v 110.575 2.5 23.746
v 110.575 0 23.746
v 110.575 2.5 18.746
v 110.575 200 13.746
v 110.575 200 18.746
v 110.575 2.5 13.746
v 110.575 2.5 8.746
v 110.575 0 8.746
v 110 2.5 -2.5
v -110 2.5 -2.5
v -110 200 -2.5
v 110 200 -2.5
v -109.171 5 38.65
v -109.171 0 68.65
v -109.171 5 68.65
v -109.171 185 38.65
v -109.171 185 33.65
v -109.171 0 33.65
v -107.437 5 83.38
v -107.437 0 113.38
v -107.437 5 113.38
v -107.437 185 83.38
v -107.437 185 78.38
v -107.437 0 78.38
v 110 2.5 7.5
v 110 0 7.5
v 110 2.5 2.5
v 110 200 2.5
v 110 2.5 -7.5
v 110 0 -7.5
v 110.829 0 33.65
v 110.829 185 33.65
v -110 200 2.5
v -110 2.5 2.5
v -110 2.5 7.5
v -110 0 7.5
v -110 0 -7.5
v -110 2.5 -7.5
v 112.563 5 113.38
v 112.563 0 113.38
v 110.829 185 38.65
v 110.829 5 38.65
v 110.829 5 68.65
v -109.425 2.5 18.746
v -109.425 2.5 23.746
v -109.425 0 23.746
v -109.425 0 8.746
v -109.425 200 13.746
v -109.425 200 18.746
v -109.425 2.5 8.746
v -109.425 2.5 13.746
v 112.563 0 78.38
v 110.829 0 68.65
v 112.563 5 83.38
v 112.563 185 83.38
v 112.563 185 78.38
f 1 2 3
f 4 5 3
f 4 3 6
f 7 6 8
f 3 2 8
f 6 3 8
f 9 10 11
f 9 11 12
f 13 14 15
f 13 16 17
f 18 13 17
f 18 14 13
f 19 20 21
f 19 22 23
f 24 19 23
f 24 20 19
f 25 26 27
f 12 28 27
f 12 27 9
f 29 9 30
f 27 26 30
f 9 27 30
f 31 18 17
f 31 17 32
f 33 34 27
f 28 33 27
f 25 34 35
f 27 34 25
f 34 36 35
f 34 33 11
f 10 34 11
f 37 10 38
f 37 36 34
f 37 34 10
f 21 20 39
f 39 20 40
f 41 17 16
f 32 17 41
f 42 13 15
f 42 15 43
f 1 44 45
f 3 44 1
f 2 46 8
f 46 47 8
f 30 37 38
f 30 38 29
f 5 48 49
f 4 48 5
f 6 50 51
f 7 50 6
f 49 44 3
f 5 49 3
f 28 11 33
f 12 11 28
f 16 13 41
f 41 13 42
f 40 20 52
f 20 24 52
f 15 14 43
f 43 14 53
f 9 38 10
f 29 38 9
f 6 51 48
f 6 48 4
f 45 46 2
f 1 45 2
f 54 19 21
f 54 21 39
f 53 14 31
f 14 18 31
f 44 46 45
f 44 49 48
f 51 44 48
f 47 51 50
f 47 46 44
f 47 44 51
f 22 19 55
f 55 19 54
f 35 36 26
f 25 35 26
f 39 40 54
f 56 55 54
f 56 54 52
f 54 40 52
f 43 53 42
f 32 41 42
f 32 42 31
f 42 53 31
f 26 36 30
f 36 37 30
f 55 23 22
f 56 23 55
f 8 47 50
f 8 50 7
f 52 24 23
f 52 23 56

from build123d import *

# Parameters (mm, degrees)
SKETCH_1_W      = 220
SKETCH_1_H      = 5
EXTRUDE_1_DEPTH = 200
SKETCH_4_W      = 220
SKETCH_4_H      = 5
EXTRUDE_2_DEPTH = 200
SKETCH_5_W      = 220
SKETCH_5_H      = 5
EXTRUDE_3_DEPTH = 185
SKETCH_8_W      = 220
SKETCH_8_H      = 5
EXTRUDE_5_DEPTH = 185
SKETCH_9_W      = 220
SKETCH_9_H      = 30
EXTRUDE_6_DEPTH = 5
SKETCH_12_W     = 220
SKETCH_12_H     = 5
EXTRUDE_8_DEPTH = 2.5


with BuildPart() as part:
    # 草图1 → 凸台-拉伸1 (new body)
    with BuildSketch(Plane(origin=(0, 0, 0), x_dir=(1, 0, 0), z_dir=(0, 1, 0))):
        Rectangle(SKETCH_1_W, SKETCH_1_H)
    extrude(amount=EXTRUDE_1_DEPTH)



with BuildPart() as body_2:
    # 草图4 → 凸台-拉伸2 (new body)
    with BuildSketch(Plane(origin=(0, 0, 0), x_dir=(1, 0, 0), z_dir=(0, 1, 0))):
        with Locations((0.575234316, -16.245858739)):
            Rectangle(SKETCH_4_W, SKETCH_4_H)
    extrude(amount=EXTRUDE_2_DEPTH)


with BuildPart() as body_3:
    # 草图5 → 凸台-拉伸3 (new body)
    with BuildSketch(Plane(origin=(0, 0, 0), x_dir=(1, 0, 0), z_dir=(0, 1, 0))):
        with Locations((0.828556731, -36.149941631)):
            Rectangle(SKETCH_5_W, SKETCH_5_H)
    extrude(amount=EXTRUDE_3_DEPTH)



with BuildPart() as body_4:
    # 草图8 → 凸台-拉伸5 (new body)
    with BuildSketch(Plane(origin=(0, 0, 0), x_dir=(1, 0, 0), z_dir=(0, 1, 0))):
        with Locations((2.56272571, -80.880026671)):
            Rectangle(SKETCH_8_W, SKETCH_8_H)
    extrude(amount=EXTRUDE_5_DEPTH)


with BuildPart() as body_3_1:
    add(body_3.part)

    add(body_4.part)  # 凸台-拉伸6 merges body 4
    # 草图9 → 凸台-拉伸6 (add)
    with BuildSketch(Plane(origin=(0, 0, 0), x_dir=(1, 0, 0), z_dir=(0, 1, 0))):
        with Locations((0.828556731, -53.649941631)):
            Rectangle(SKETCH_9_W, SKETCH_9_H)
        with Locations((2.56272571, -98.380026671)):
            Rectangle(SKETCH_9_W, SKETCH_9_H)
    extrude(amount=EXTRUDE_6_DEPTH)


with BuildPart() as part_1:
    add(part.part)

    add(body_2.part)  # 凸台-拉伸8 merges body 2
    # 草图12 → 凸台-拉伸8 (add)
    with BuildSketch(Plane(origin=(0, 0, 0), x_dir=(1, 0, 0), z_dir=(0, 1, 0))):
        with Locations((0.575234316, -21.245858739)):
            Rectangle(SKETCH_12_W, SKETCH_12_H)
        with Locations((0.575234316, -11.245858739)):
            Rectangle(SKETCH_12_W, SKETCH_12_H)
        with Locations((0, -5)):
            Rectangle(SKETCH_12_W, SKETCH_12_H)
        with Locations((0, 5)):
            Rectangle(SKETCH_12_W, SKETCH_12_H)
    extrude(amount=EXTRUDE_8_DEPTH)


solid = Compound([body_3_1.part, part_1.part])
